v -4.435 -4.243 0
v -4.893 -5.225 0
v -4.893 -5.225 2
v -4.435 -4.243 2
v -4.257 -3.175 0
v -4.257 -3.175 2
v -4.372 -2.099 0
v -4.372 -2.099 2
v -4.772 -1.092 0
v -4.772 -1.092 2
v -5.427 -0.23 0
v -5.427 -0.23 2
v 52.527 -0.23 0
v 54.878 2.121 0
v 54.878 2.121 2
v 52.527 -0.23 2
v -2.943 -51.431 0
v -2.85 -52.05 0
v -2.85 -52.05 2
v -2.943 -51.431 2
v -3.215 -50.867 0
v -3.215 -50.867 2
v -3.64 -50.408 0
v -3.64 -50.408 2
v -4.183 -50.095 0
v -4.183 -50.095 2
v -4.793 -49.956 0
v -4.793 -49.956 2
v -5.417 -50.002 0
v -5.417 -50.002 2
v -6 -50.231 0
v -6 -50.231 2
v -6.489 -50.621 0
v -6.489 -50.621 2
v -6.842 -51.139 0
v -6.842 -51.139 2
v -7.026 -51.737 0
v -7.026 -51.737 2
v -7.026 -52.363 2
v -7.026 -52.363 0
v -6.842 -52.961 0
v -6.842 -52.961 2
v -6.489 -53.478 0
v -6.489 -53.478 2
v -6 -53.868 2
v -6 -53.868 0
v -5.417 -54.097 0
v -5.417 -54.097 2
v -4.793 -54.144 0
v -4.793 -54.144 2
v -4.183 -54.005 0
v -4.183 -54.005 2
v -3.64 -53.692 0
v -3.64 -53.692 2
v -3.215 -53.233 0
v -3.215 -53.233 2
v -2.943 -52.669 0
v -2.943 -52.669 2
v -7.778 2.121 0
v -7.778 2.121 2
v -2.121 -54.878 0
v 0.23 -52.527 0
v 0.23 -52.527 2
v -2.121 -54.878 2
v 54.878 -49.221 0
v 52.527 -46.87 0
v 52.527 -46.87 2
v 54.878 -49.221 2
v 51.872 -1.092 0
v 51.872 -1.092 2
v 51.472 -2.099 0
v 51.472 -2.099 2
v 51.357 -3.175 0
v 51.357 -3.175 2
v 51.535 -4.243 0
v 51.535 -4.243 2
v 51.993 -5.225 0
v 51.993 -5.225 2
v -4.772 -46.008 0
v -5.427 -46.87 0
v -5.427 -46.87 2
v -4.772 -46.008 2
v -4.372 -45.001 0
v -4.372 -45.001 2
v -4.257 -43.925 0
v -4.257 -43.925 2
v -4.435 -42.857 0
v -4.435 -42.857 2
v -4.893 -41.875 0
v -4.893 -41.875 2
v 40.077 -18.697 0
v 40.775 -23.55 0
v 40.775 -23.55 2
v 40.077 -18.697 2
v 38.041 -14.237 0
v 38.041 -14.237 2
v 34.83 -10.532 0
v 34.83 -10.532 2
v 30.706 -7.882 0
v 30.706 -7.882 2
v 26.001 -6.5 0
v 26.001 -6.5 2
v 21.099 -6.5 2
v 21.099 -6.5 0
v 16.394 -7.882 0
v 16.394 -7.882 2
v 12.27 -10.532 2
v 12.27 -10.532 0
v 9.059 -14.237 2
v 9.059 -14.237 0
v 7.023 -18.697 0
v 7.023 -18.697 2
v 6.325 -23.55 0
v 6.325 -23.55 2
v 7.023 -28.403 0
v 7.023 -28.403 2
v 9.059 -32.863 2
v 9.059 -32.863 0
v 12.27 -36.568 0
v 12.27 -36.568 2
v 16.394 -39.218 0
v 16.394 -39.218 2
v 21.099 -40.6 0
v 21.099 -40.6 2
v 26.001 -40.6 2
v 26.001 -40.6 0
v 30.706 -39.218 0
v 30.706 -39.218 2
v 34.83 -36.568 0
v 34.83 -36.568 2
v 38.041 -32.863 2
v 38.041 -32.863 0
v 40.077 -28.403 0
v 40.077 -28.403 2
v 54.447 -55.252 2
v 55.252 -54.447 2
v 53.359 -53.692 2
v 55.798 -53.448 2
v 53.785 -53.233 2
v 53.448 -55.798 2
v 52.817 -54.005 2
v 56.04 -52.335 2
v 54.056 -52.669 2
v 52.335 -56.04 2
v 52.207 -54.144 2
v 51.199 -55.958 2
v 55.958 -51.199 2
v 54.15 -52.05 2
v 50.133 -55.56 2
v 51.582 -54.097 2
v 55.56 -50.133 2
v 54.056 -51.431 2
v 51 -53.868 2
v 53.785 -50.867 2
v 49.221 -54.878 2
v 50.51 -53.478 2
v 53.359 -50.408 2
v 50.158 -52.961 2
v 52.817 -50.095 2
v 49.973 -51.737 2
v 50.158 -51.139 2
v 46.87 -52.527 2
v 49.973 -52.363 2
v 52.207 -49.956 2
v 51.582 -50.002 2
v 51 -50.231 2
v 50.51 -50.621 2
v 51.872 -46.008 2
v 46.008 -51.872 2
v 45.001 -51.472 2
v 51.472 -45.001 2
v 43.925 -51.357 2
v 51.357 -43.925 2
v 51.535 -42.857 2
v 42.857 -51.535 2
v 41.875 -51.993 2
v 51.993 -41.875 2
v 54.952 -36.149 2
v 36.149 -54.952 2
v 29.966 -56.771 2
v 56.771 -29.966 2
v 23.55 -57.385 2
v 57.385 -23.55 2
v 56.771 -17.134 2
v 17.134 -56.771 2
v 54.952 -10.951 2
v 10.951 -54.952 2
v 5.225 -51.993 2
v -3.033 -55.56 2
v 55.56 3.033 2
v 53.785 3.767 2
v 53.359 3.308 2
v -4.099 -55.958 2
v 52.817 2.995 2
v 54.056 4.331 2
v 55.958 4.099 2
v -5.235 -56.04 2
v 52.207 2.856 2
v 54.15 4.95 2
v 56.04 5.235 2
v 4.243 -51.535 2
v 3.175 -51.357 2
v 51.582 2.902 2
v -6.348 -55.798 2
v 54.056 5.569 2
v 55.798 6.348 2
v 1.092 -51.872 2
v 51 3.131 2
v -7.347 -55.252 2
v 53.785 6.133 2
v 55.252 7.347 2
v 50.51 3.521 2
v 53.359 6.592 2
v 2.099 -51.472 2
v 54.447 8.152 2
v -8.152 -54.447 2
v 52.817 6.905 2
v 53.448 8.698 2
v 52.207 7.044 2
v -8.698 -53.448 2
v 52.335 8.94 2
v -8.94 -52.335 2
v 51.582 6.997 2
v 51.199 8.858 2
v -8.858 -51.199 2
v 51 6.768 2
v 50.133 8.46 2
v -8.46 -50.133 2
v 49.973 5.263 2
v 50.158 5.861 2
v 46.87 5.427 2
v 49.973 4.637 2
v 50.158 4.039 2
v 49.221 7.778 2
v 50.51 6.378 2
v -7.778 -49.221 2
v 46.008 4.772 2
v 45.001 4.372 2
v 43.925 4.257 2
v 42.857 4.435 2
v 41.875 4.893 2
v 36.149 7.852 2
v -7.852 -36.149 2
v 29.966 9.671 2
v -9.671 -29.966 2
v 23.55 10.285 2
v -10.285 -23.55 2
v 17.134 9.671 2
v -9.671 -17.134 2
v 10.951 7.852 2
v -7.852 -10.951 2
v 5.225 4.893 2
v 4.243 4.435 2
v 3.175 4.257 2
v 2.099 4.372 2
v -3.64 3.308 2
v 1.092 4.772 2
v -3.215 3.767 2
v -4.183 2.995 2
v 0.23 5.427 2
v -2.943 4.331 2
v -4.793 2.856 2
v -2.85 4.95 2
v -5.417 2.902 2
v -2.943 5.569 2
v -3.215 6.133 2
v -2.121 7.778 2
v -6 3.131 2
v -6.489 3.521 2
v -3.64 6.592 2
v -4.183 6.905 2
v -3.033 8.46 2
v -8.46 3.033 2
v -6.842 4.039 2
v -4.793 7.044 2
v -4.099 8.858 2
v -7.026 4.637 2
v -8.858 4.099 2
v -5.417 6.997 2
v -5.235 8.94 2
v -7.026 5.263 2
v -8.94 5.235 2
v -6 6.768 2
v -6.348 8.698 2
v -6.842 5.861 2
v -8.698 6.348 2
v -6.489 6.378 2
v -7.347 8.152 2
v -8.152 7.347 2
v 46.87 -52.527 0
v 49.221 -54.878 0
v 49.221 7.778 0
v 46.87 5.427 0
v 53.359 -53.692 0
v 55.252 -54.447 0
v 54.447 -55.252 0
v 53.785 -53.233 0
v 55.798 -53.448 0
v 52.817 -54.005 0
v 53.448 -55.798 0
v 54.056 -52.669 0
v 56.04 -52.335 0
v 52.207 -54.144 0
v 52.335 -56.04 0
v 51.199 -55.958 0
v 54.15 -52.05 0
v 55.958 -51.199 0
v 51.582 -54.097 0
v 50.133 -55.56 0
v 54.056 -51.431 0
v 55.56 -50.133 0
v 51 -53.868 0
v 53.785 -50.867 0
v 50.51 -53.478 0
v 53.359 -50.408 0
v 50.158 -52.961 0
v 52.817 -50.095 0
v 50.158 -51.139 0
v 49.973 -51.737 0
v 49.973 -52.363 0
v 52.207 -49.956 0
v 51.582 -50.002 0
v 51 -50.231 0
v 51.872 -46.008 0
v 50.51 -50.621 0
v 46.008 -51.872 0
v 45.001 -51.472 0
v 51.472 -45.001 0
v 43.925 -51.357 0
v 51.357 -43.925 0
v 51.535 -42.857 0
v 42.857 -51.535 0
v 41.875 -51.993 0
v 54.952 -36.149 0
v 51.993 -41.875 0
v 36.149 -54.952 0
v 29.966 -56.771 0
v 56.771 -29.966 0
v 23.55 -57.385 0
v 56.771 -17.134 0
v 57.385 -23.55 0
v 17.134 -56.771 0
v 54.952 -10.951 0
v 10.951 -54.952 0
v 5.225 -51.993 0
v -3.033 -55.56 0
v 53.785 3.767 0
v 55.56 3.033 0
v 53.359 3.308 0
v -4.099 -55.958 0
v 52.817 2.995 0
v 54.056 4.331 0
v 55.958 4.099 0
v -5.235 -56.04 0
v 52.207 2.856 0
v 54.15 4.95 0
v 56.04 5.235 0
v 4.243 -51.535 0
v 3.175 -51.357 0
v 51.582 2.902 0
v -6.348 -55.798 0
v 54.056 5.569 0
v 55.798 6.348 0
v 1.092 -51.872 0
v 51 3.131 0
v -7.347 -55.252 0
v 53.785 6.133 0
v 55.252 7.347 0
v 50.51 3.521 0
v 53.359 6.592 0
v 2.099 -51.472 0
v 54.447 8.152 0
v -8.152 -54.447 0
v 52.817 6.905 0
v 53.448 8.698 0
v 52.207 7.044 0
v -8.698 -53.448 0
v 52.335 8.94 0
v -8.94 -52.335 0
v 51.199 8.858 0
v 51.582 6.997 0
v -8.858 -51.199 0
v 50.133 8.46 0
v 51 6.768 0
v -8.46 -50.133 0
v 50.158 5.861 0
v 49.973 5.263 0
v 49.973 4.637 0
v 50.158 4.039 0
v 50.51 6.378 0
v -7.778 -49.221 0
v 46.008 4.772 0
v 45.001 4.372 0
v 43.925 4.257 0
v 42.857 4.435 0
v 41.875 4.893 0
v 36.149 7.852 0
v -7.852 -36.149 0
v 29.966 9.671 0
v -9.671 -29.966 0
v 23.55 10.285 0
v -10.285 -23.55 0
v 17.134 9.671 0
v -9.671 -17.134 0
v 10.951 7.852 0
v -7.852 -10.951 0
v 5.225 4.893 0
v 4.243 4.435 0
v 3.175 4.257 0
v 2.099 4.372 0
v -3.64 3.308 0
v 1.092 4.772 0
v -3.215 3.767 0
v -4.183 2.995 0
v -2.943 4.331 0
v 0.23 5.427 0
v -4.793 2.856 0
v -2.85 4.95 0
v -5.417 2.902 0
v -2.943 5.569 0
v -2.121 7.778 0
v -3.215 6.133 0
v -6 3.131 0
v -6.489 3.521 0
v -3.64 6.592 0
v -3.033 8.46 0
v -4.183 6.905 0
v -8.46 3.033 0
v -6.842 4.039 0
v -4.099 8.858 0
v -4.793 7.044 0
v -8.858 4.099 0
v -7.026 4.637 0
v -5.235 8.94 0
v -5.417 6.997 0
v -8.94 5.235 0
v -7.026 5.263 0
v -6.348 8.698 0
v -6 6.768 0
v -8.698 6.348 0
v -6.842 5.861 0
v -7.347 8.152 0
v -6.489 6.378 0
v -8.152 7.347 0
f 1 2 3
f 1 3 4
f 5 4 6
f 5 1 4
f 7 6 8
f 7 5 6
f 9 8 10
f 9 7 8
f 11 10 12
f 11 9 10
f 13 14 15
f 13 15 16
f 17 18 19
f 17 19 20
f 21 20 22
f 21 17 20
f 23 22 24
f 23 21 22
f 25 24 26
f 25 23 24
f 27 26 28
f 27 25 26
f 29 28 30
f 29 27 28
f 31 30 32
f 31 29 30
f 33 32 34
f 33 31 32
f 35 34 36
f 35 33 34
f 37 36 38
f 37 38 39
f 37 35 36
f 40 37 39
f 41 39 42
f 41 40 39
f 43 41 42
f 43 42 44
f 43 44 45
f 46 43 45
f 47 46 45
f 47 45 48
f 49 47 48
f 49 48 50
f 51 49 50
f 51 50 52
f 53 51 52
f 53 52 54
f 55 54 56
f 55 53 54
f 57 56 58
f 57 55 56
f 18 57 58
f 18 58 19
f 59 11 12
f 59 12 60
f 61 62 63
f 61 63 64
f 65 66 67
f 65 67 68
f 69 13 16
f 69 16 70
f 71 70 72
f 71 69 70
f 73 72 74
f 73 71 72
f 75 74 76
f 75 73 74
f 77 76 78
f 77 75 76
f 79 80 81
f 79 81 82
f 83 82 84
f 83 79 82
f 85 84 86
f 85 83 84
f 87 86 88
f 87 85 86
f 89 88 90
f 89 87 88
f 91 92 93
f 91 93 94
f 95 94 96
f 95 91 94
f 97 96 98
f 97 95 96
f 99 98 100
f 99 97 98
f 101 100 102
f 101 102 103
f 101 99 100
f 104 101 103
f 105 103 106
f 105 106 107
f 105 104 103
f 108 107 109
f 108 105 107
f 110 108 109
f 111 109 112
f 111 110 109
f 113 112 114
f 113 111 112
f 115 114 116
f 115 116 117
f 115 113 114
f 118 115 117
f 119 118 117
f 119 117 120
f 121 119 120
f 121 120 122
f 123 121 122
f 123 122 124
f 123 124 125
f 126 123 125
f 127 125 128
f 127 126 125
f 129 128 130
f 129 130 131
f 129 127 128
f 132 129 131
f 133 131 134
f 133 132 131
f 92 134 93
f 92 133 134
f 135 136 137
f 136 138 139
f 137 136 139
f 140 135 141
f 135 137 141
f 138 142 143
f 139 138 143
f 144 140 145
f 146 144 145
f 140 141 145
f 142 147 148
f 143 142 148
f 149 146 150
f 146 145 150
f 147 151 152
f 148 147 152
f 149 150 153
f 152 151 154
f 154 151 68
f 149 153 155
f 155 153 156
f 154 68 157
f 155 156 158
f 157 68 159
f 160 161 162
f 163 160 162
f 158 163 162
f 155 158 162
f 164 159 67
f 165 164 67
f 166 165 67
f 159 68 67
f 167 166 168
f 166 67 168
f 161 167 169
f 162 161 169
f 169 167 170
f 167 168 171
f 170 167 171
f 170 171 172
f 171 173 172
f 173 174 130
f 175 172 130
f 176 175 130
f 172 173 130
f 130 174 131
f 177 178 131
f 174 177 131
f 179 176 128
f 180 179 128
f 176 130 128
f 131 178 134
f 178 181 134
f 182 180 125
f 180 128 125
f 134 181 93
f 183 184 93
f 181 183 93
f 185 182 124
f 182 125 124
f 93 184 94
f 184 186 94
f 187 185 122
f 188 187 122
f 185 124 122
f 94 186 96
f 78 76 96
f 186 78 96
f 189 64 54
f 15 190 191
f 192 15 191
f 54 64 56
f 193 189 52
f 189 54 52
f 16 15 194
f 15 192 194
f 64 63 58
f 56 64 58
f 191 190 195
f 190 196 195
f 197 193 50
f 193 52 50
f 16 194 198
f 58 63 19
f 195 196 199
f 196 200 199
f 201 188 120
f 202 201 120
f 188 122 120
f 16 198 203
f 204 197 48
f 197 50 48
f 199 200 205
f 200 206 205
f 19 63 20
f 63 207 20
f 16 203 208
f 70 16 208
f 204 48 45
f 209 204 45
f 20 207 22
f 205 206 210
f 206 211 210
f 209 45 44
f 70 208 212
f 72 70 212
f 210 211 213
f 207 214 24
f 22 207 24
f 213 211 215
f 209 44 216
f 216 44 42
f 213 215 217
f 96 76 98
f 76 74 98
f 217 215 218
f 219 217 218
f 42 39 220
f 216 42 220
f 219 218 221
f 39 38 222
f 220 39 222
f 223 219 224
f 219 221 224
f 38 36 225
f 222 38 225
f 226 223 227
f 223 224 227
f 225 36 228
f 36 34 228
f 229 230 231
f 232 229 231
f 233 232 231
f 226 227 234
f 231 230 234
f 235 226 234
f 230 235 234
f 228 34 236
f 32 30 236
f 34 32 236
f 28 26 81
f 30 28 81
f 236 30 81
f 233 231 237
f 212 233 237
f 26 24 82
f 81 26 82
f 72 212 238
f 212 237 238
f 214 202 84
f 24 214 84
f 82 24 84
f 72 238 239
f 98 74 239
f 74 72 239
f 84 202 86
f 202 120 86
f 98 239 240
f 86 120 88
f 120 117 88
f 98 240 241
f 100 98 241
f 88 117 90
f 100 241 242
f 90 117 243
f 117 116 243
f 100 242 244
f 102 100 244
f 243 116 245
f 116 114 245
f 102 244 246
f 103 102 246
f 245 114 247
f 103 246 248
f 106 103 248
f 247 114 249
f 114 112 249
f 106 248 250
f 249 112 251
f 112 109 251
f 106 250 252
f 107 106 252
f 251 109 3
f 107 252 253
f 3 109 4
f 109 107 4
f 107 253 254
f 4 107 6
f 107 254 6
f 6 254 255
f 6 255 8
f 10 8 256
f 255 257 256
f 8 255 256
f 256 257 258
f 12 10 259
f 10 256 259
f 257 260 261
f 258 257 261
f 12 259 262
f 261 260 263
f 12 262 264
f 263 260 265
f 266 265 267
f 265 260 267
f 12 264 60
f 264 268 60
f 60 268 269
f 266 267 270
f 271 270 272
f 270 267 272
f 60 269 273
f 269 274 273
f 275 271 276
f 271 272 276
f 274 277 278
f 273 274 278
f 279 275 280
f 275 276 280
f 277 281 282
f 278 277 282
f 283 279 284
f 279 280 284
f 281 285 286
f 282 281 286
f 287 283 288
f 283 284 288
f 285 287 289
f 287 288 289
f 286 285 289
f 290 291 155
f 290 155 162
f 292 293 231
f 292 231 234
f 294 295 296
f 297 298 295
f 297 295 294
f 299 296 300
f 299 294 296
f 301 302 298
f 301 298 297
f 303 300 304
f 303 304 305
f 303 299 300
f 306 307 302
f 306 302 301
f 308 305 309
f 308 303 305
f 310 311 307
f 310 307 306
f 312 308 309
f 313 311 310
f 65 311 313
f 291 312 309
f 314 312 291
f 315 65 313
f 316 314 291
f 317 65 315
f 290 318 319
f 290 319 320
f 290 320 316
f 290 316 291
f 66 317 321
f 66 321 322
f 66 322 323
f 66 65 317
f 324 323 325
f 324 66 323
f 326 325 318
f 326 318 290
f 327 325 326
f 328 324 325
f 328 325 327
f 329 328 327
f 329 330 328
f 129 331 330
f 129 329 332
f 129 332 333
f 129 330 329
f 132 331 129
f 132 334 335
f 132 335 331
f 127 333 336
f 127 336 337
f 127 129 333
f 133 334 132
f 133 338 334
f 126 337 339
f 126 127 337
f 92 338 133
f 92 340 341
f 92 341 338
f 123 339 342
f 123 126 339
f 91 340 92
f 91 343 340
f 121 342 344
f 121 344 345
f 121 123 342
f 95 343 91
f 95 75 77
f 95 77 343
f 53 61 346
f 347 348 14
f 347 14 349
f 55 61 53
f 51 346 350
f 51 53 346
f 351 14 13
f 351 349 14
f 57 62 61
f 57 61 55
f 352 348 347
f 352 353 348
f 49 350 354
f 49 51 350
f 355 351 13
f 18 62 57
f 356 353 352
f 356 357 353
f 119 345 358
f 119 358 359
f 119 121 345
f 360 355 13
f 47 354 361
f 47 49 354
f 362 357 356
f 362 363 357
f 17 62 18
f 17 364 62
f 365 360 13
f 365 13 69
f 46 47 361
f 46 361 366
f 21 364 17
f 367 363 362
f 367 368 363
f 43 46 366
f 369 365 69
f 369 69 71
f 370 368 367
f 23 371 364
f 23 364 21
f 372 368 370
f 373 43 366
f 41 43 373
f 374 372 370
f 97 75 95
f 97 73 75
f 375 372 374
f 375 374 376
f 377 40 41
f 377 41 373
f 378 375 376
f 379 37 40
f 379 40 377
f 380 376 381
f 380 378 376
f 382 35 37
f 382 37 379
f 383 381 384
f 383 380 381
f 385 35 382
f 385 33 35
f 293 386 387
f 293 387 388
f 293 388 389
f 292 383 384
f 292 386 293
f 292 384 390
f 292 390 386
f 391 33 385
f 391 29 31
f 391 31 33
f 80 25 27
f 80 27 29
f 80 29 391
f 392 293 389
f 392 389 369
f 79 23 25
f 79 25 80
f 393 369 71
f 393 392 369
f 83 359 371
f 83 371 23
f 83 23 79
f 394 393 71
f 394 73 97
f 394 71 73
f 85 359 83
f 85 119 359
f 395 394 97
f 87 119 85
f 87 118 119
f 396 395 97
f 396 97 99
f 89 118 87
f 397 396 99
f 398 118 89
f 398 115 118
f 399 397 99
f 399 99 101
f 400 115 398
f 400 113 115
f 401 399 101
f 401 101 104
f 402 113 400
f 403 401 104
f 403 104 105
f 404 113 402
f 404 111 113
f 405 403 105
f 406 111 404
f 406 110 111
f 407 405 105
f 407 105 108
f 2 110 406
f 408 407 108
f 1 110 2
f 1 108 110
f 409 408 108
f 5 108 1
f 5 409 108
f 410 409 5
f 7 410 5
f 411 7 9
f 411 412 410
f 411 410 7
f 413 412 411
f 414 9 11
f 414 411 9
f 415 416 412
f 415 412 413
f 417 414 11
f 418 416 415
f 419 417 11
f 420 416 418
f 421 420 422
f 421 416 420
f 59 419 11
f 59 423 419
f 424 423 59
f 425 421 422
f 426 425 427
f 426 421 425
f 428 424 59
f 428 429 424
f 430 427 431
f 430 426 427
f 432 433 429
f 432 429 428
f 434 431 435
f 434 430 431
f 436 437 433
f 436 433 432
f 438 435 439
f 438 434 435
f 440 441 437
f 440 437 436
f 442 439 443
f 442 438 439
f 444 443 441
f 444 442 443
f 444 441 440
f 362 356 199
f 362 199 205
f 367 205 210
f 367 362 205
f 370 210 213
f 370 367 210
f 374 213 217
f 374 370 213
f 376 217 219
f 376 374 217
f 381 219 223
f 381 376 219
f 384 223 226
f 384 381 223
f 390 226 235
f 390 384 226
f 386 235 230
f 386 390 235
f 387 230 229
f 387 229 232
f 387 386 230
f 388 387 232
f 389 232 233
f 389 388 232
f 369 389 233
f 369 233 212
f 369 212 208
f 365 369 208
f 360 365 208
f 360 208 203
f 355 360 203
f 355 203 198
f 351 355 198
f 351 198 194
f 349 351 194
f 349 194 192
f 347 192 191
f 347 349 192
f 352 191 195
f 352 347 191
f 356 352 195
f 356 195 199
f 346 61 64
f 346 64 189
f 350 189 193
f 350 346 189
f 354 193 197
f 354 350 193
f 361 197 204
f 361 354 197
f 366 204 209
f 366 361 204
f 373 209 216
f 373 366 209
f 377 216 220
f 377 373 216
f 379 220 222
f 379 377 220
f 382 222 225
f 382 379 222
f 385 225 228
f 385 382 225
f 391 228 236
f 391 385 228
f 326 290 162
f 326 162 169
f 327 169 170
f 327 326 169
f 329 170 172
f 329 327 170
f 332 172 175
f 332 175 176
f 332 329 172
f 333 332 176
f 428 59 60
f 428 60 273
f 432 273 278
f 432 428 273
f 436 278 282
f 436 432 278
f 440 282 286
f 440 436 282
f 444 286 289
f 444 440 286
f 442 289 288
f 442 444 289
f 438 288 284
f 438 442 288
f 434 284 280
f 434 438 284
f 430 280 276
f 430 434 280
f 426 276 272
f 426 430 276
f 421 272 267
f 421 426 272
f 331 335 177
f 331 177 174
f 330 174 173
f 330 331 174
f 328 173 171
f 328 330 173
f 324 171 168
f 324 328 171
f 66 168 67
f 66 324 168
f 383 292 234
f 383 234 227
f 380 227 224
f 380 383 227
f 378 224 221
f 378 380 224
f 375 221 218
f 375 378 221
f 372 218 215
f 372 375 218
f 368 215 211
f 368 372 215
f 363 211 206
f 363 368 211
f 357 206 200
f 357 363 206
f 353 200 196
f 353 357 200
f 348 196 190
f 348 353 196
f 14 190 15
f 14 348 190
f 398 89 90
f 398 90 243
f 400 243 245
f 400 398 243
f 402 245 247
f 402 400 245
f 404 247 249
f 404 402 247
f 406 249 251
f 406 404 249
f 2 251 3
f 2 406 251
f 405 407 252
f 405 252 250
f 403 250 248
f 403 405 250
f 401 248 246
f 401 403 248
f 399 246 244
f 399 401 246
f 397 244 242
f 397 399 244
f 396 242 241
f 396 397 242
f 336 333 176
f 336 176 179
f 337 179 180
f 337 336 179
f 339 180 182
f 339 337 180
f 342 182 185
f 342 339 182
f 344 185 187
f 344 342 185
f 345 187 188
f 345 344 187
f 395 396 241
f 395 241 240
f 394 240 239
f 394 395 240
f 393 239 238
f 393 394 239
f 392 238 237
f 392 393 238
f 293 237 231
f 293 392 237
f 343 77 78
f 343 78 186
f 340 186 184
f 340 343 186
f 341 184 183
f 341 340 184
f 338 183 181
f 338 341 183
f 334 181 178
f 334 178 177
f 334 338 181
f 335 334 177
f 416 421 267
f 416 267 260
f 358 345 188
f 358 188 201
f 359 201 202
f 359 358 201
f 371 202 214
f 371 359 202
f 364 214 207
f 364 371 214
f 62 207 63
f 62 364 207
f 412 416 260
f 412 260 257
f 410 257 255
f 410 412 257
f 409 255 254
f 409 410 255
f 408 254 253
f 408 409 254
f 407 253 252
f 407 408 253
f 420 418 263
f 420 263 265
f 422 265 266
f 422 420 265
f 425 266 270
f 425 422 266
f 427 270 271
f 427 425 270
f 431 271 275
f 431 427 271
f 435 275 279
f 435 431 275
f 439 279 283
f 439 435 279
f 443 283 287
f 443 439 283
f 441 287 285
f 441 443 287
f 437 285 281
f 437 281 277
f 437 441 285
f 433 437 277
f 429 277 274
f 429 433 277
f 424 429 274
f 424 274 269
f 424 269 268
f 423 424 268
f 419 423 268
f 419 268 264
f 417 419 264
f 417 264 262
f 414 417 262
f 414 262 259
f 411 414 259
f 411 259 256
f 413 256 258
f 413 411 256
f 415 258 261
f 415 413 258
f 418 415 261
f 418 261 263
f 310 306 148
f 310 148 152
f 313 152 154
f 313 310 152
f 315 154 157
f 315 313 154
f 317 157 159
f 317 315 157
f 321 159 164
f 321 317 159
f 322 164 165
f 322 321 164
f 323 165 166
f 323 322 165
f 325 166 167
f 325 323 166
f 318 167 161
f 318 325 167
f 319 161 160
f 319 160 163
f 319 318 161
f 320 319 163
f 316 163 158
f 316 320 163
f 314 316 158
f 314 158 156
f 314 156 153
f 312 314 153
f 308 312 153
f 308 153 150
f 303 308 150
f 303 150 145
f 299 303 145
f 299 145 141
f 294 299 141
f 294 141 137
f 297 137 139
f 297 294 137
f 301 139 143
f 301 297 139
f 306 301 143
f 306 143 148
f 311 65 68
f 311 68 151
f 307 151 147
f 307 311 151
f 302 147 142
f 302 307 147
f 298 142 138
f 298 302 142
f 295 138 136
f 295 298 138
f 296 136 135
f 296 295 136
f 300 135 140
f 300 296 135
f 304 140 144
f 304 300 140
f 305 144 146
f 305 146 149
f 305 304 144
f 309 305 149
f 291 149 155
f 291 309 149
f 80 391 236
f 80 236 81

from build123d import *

# Parameters (mm, degrees)
SKETCH_1_R      = 2.1
SKETCH_1_R_2    = 17.225
EXTRUDE_1_DEPTH = 2


with BuildPart() as part:
    # 草图1 → 凸台-拉伸1 (new body)
    with BuildSketch(Plane.XY):
        with BuildLine():
            Line((49.221320344, -54.878174593), (46.870064467, -52.526918716))
            ThreePointArc((46.870064467, -52.526918716), (44.466937039, -51.378020085), (41.875216055, -51.992814233))
            ThreePointArc((41.875216055, -51.992814233), (23.55, -57.385), (5.224783944, -51.992814233))
            ThreePointArc((5.224783944, -51.992814233), (2.633062961, -51.378020085), (0.229935533, -52.526918716))
            Line((0.229935533, -52.526918716), (-2.121320344, -54.878174593))
            ThreePointArc((-2.121320344, -54.878174593), (-7.778174593, -54.878174593), (-7.778174593, -49.221320343))
            Line((-7.778174593, -49.221320343), (-5.426918716, -46.870064466))
            ThreePointArc((-5.426918716, -46.870064466), (-4.278020085, -44.466937039), (-4.892814233, -41.875216055))
            ThreePointArc((-4.892814233, -41.875216055), (-10.285, -23.55), (-4.892814233, -5.224783944))
            ThreePointArc((-4.892814233, -5.224783944), (-4.278020085, -2.633062961), (-5.426918716, -0.229935533))
            Line((-5.426918716, -0.229935533), (-7.778174593, 2.121320344))
            ThreePointArc((-7.778174593, 2.121320344), (-7.778174593, 7.778174593), (-2.121320343, 7.778174593))
            Line((-2.121320343, 7.778174593), (0.229935534, 5.426918716))
            ThreePointArc((0.229935534, 5.426918716), (2.633062962, 4.278020085), (5.224783945, 4.892814234))
            ThreePointArc((5.224783945, 4.892814234), (23.55, 10.285), (41.875216056, 4.892814233))
            ThreePointArc((41.875216056, 4.892814233), (44.466937039, 4.278020085), (46.870064467, 5.426918716))
            Line((46.870064467, 5.426918716), (49.221320344, 7.778174593))
            ThreePointArc((49.221320344, 7.778174593), (54.878174593, 7.778174593), (54.878174593, 2.121320344))
            Line((54.878174593, 2.121320344), (52.526918716, -0.229935533))
            ThreePointArc((52.526918716, -0.229935533), (51.378020085, -2.633062961), (51.992814234, -5.224783945))
            ThreePointArc((51.992814234, -5.224783945), (57.385, -23.55), (51.992814233, -41.875216055))
            ThreePointArc((51.992814233, -41.875216055), (51.378020085, -44.466937039), (52.526918716, -46.870064467))
            Line((52.526918716, -46.870064467), (54.878174593, -49.221320344))
            ThreePointArc((54.878174593, -49.221320344), (54.878174593, -54.878174593), (49.221320344, -54.878174593))
        make_face()
        with Locations((52.049747468, -52.049747468)):
            Circle(SKETCH_1_R, mode=Mode.SUBTRACT)
        with Locations((-4.949747468, -52.049747468)):
            Circle(SKETCH_1_R, mode=Mode.SUBTRACT)
        with Locations((-4.949747468, 4.949747468)):
            Circle(SKETCH_1_R, mode=Mode.SUBTRACT)
        with Locations((52.049747468, 4.949747468)):
            Circle(SKETCH_1_R, mode=Mode.SUBTRACT)
        with Locations((23.55, -23.55)):
            Circle(SKETCH_1_R_2, mode=Mode.SUBTRACT)
    extrude(amount=EXTRUDE_1_DEPTH)


solid = part.part
